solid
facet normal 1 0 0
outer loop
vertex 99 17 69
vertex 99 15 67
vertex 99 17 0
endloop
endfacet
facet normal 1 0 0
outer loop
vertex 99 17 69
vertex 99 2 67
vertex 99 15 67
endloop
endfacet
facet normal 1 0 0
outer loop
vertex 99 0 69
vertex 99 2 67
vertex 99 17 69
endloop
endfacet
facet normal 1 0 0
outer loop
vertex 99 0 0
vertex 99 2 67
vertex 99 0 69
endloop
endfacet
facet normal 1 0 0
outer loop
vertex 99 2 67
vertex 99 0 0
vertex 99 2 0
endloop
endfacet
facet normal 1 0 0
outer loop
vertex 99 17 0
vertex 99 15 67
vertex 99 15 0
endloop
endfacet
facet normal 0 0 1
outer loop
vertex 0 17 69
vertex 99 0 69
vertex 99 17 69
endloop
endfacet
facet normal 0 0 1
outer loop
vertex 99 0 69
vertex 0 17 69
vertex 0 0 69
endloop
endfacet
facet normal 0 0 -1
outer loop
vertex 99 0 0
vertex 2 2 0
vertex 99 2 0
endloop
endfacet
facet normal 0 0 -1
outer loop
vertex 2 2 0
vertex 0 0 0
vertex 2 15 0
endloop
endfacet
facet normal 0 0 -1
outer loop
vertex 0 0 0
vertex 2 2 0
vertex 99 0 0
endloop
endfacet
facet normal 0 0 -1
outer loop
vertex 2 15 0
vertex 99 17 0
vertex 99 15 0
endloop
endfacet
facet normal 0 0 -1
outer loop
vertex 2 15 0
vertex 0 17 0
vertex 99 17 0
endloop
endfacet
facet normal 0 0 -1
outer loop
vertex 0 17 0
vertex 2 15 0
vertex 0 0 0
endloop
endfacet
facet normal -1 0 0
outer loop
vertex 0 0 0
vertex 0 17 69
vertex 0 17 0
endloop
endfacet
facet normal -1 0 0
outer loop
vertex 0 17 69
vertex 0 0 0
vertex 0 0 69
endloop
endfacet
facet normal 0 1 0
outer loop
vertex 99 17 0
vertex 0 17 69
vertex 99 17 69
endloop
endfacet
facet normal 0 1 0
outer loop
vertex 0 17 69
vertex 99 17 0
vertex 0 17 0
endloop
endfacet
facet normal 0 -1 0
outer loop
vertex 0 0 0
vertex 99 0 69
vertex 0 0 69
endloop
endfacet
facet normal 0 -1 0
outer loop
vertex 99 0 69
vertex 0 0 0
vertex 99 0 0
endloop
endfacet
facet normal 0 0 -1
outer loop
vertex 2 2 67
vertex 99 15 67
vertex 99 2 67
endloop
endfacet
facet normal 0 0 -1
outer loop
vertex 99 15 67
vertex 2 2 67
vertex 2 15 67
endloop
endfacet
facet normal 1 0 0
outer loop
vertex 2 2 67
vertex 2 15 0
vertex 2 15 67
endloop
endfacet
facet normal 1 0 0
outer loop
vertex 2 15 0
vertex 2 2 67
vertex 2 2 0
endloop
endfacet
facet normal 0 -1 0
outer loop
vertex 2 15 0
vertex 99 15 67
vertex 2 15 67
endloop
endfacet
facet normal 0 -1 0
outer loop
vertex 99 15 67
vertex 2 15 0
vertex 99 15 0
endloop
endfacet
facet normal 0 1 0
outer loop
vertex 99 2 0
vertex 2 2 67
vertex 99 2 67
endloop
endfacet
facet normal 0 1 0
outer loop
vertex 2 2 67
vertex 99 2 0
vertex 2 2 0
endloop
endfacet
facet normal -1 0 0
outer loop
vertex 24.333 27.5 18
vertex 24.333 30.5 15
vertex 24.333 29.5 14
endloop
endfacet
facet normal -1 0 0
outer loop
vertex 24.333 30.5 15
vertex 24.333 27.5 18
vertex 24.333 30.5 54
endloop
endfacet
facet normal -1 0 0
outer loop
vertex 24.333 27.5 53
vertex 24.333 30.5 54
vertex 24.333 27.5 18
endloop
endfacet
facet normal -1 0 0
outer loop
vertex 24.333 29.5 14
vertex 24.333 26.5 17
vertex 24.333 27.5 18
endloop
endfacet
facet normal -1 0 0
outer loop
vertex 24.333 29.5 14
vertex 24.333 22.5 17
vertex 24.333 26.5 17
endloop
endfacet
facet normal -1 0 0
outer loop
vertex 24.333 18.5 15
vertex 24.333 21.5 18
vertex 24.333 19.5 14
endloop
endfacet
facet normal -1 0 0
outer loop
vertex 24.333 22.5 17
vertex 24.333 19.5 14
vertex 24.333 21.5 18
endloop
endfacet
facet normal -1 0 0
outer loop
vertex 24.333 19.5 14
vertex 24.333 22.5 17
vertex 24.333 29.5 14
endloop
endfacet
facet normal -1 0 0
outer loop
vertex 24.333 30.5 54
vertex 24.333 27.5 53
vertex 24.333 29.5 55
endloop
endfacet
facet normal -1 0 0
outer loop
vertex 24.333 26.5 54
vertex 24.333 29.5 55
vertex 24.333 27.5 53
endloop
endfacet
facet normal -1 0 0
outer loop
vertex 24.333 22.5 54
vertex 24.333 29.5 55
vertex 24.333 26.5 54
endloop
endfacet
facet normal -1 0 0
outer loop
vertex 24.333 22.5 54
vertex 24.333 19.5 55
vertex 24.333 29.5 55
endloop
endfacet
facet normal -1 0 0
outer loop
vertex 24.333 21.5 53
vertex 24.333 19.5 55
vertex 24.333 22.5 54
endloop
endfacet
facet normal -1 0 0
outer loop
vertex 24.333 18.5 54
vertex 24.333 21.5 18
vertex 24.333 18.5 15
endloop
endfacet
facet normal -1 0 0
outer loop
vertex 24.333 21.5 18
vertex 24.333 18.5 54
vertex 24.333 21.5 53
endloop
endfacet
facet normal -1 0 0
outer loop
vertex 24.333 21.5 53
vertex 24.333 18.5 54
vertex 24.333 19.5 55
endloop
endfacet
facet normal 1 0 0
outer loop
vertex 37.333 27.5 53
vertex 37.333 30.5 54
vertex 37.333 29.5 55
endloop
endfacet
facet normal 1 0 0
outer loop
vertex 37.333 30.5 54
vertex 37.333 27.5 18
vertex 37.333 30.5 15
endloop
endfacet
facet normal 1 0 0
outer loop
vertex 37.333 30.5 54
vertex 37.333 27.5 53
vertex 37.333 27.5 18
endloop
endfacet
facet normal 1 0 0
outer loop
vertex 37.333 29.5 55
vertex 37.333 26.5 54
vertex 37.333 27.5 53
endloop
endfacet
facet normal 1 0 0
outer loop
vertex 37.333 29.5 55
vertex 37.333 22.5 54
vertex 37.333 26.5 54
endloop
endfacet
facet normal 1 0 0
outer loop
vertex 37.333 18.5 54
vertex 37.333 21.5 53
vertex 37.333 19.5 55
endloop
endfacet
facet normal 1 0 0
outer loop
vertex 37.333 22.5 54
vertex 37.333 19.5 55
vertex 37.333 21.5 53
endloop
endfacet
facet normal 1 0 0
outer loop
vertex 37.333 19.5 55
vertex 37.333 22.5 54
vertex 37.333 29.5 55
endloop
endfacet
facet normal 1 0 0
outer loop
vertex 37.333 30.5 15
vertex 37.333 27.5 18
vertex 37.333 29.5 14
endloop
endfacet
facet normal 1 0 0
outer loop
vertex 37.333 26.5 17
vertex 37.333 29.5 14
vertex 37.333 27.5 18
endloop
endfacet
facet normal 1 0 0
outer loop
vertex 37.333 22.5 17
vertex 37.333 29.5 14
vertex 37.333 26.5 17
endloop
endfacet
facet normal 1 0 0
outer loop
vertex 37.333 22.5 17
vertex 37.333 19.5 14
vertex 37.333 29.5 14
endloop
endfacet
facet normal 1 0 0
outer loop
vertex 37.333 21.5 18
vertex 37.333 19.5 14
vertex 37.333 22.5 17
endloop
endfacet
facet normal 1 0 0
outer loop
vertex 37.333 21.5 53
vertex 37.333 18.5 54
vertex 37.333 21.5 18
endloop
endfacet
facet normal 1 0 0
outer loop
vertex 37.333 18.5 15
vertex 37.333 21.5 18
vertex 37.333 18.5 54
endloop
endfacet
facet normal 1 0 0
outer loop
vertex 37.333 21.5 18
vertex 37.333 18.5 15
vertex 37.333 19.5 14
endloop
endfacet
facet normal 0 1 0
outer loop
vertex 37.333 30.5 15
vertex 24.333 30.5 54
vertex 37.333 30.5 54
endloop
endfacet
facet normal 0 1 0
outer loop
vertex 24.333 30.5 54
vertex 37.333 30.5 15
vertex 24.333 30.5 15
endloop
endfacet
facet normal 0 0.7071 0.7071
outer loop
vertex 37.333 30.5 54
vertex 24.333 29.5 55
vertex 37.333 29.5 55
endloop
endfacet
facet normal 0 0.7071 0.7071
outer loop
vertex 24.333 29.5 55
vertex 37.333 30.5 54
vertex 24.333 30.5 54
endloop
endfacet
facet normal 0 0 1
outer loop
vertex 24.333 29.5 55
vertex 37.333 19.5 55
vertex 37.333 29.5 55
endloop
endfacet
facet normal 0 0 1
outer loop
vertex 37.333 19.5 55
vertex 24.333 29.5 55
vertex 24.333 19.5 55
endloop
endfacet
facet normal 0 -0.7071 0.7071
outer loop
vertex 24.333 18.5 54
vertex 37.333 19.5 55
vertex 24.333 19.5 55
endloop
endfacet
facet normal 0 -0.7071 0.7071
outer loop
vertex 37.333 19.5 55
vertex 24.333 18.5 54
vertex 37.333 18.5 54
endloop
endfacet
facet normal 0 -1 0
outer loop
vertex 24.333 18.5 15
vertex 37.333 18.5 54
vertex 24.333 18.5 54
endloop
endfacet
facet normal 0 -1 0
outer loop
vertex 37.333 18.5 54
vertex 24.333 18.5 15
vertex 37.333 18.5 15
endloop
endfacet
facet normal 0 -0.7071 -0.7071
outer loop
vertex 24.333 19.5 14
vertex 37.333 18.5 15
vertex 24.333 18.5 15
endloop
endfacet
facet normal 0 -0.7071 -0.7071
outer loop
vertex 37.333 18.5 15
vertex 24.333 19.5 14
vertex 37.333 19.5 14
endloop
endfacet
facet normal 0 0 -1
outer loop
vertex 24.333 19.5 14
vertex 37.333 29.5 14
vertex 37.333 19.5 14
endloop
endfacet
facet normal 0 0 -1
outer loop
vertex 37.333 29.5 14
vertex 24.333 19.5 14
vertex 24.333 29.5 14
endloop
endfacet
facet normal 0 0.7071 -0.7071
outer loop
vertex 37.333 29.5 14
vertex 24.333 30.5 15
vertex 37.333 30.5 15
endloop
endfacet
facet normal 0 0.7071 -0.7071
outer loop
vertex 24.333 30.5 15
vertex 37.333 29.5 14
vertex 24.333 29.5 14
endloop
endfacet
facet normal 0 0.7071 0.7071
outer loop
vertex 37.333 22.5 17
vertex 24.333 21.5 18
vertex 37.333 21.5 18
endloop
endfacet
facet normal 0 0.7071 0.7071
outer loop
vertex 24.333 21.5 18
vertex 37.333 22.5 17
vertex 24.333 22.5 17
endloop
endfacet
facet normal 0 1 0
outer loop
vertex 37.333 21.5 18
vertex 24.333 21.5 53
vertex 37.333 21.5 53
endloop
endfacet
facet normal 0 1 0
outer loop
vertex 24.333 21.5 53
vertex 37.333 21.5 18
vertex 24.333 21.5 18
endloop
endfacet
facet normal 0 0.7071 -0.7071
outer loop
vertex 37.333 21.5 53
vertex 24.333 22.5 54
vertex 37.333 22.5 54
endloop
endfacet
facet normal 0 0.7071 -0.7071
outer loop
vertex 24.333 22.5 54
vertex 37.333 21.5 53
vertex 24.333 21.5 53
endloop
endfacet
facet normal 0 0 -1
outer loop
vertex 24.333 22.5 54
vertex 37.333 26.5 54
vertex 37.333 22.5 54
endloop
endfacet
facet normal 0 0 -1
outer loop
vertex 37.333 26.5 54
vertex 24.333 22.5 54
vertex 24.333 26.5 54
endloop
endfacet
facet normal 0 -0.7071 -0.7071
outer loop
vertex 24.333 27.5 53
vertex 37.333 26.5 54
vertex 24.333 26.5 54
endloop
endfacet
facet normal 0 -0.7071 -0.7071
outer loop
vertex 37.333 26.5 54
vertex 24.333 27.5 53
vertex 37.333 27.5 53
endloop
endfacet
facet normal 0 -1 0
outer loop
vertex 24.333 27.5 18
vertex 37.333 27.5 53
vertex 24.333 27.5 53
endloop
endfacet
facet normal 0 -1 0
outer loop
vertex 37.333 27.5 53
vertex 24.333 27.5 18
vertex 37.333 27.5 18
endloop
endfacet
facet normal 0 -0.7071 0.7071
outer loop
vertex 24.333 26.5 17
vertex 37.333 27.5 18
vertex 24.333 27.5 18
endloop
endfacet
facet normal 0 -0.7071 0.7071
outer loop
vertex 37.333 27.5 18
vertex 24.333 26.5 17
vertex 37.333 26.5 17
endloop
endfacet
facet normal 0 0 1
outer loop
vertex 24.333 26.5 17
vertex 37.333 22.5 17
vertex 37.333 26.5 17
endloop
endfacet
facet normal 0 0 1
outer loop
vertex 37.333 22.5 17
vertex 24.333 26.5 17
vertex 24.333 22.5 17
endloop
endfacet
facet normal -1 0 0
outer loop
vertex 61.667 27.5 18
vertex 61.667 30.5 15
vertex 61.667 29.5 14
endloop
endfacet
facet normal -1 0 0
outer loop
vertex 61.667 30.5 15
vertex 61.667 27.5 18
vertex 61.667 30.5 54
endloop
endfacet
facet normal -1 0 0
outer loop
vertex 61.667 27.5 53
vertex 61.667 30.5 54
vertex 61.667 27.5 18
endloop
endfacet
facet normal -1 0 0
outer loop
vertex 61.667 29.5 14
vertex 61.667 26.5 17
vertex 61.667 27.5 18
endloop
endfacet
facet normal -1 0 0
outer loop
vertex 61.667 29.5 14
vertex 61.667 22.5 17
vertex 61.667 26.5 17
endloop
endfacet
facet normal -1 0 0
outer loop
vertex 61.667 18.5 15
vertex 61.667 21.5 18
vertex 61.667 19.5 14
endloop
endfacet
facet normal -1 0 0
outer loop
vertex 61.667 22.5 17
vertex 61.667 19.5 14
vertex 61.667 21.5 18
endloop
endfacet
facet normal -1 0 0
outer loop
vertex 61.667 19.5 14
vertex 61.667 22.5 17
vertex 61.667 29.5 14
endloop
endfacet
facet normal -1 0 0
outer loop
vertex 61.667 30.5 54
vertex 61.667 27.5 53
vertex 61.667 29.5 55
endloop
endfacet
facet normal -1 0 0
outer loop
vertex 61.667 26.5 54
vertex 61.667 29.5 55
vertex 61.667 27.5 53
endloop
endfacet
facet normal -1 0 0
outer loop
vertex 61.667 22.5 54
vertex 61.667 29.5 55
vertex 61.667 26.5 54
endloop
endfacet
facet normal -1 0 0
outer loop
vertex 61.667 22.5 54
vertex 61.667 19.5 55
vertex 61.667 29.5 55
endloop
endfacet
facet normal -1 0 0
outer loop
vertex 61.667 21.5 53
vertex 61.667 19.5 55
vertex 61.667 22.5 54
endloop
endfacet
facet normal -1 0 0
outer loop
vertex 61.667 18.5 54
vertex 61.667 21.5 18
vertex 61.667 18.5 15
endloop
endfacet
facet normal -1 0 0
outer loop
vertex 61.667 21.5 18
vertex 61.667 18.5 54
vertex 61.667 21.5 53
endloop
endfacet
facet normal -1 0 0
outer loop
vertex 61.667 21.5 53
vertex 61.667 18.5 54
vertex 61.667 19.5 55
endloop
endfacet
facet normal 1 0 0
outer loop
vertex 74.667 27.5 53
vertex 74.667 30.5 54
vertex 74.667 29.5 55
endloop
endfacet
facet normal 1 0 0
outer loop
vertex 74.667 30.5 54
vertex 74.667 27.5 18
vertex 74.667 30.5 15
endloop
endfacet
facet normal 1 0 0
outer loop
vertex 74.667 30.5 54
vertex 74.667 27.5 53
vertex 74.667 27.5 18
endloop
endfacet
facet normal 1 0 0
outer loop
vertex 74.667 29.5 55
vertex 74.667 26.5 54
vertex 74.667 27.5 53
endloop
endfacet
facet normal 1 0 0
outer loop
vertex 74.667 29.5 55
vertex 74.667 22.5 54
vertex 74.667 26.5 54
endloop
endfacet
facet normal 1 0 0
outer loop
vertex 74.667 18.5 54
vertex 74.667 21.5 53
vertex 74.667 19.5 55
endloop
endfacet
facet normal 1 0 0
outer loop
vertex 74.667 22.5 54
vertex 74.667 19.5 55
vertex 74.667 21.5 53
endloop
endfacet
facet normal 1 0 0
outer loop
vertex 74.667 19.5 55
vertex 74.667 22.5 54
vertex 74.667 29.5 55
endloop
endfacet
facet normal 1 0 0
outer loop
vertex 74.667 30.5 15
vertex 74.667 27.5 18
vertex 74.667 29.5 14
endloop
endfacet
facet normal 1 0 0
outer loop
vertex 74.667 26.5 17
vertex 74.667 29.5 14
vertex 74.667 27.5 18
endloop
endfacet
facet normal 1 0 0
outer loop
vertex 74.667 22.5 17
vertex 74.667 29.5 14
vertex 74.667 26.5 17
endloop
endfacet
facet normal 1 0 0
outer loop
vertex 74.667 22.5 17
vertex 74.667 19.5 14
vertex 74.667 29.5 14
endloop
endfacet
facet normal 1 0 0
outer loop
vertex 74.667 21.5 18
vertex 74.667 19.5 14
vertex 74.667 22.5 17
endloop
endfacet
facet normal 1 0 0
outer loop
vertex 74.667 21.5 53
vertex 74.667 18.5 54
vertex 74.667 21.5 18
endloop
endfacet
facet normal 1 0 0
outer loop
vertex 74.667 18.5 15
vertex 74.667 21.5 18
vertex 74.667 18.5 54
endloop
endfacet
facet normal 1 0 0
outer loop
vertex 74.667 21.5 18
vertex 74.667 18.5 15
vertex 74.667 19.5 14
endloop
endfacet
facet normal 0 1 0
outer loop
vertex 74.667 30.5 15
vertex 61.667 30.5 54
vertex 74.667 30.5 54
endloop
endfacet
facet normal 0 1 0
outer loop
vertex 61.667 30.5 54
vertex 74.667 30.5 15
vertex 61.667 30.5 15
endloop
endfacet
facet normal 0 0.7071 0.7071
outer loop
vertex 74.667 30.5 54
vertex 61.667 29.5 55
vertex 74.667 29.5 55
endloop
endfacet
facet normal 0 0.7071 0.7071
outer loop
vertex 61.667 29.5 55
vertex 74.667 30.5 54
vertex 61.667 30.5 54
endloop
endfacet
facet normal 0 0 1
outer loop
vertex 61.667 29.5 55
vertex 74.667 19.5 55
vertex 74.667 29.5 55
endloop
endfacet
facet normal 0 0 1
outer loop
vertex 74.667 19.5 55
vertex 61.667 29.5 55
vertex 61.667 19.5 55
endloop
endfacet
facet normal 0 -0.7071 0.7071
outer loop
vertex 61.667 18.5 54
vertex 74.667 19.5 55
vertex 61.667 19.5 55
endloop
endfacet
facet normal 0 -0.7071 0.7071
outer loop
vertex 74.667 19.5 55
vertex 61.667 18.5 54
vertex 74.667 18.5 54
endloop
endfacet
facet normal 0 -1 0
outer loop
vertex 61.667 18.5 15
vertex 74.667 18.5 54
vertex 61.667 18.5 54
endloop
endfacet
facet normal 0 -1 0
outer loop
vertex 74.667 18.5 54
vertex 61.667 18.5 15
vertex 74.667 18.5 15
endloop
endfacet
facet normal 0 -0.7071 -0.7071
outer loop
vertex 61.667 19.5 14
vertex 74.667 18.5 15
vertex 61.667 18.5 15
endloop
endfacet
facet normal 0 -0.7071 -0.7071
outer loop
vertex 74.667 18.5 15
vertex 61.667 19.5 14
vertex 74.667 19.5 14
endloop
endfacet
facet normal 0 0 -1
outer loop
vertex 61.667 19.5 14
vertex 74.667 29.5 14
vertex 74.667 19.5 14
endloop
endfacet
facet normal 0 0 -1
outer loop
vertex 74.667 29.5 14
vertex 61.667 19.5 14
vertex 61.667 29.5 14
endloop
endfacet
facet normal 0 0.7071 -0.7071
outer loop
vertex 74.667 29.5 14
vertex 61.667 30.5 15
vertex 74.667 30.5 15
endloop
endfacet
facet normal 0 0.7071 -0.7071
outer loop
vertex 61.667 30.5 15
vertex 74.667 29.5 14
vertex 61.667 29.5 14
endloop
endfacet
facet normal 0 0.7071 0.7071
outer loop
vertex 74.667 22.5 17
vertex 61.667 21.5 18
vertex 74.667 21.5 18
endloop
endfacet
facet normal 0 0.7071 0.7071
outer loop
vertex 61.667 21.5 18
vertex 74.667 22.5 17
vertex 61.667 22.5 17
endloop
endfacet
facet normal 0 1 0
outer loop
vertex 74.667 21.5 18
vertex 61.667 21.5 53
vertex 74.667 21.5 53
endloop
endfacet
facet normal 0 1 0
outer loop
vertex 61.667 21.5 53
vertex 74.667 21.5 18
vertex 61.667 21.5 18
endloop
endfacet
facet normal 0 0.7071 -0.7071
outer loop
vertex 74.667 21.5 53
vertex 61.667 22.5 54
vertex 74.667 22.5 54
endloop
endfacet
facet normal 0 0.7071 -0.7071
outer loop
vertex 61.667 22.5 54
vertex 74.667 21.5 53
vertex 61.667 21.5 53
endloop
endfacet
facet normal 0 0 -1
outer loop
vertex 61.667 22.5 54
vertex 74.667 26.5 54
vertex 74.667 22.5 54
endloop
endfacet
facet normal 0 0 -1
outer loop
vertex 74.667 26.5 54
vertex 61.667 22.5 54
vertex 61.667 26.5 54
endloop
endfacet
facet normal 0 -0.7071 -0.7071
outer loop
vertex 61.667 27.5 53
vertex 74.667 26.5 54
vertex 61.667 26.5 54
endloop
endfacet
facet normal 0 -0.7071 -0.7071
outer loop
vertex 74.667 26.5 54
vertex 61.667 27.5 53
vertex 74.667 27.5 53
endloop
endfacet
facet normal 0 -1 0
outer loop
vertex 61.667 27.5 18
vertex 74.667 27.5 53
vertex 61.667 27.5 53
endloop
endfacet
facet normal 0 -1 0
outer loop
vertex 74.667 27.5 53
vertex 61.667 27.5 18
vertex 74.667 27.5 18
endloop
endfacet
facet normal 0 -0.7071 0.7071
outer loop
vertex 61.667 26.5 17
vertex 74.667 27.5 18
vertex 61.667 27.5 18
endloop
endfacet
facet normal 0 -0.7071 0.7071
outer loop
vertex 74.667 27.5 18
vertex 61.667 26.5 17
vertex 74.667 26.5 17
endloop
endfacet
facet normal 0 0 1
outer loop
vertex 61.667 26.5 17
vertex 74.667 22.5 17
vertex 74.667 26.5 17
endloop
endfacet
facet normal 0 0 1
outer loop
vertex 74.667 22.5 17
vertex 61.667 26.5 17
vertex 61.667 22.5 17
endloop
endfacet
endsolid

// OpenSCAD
////////////////////
// パラメータ
////////////////////
box_w = 99;   // 幅（X）
box_d = 17;   // 奥行き（Y）
box_h = 69;   // 高さ（Z）
wall  = 2.0;  // 箱の肉厚

// ベルトループ
loop_extrude = 13;   // 押し出し厚さ（ベルト幅方向 X）
loop_h       = 39;   // ループ全高（Y方向に倒して使う）
loop_thick   = 3;    // ループ板厚
loop_gap_h   = 35;   // ベルトが通る隙間（X方向の高さ）
loop_r       = 1;    // 角丸半径
loop_offsetY = 2.5;  // 背面からのオフセット
loop_pos_z   = 15;   // 箱底からの取り付け高さ（ループ下端）

////////////////////
// メイン形状
////////////////////
module main_box() {
    difference() {
        cube([box_w, box_d, box_h], center=false);
        translate([wall, wall, 0])
            cube([box_w - wall,
                  box_d - 2*wall,
                  box_h - wall], center=false);
    }
}

main_box();
belt_loops();

////////////////////
// ベルトループ断面（元は Y-Z 平面）
////////////////////
// Y=0 が箱背面、Z=0 がループ下端
module belt_loop_profile() {

    outer_w = loop_thick*2 + 4;   // ループ全体の「奥行き」（箱からの出っ張り量）

    inner_bottom = loop_thick;
    inner_top    = inner_bottom + loop_gap_h;

    difference() {
        // 外側輪郭
        offset(r=loop_r)
            polygon(points=[
                [0, 0],
                [outer_w, 0],
                [outer_w, loop_h],
                [0, loop_h]
            ]);

        // 内側の穴（ベルト通し部）
        offset(r=loop_r)
            polygon(points=[
                [loop_thick,           inner_bottom],
                [outer_w - loop_thick, inner_bottom],
                [outer_w - loop_thick, inner_top],
                [loop_thick,           inner_top]
            ]);
    }
}

// ループ1個：
// 断面(YZ)を X方向に押し出し → Z軸回りに90°回転させて
// 「縦長がY方向・開口が上(＋Z側)」になるようにする
module belt_loop() {
    rotate([90,0,90])                // 断面を寝かせる
        linear_extrude(height = loop_extrude, center=false)
            belt_loop_profile();
}

// 2個並べて背面に沿わせて配置
module belt_loops() {

    // X方向の配置間隔（左右2個）
    space = (box_w - 2*loop_extrude) / 3;

    // 1個目
    translate([space,
               box_d + loop_offsetY,   // 背面から外側へ
               loop_pos_z])            // ループ下端の高さ
        belt_loop();

    // 2個目
    translate([2*space + loop_extrude,
               box_d + loop_offsetY,
               loop_pos_z])
        belt_loop();
}
